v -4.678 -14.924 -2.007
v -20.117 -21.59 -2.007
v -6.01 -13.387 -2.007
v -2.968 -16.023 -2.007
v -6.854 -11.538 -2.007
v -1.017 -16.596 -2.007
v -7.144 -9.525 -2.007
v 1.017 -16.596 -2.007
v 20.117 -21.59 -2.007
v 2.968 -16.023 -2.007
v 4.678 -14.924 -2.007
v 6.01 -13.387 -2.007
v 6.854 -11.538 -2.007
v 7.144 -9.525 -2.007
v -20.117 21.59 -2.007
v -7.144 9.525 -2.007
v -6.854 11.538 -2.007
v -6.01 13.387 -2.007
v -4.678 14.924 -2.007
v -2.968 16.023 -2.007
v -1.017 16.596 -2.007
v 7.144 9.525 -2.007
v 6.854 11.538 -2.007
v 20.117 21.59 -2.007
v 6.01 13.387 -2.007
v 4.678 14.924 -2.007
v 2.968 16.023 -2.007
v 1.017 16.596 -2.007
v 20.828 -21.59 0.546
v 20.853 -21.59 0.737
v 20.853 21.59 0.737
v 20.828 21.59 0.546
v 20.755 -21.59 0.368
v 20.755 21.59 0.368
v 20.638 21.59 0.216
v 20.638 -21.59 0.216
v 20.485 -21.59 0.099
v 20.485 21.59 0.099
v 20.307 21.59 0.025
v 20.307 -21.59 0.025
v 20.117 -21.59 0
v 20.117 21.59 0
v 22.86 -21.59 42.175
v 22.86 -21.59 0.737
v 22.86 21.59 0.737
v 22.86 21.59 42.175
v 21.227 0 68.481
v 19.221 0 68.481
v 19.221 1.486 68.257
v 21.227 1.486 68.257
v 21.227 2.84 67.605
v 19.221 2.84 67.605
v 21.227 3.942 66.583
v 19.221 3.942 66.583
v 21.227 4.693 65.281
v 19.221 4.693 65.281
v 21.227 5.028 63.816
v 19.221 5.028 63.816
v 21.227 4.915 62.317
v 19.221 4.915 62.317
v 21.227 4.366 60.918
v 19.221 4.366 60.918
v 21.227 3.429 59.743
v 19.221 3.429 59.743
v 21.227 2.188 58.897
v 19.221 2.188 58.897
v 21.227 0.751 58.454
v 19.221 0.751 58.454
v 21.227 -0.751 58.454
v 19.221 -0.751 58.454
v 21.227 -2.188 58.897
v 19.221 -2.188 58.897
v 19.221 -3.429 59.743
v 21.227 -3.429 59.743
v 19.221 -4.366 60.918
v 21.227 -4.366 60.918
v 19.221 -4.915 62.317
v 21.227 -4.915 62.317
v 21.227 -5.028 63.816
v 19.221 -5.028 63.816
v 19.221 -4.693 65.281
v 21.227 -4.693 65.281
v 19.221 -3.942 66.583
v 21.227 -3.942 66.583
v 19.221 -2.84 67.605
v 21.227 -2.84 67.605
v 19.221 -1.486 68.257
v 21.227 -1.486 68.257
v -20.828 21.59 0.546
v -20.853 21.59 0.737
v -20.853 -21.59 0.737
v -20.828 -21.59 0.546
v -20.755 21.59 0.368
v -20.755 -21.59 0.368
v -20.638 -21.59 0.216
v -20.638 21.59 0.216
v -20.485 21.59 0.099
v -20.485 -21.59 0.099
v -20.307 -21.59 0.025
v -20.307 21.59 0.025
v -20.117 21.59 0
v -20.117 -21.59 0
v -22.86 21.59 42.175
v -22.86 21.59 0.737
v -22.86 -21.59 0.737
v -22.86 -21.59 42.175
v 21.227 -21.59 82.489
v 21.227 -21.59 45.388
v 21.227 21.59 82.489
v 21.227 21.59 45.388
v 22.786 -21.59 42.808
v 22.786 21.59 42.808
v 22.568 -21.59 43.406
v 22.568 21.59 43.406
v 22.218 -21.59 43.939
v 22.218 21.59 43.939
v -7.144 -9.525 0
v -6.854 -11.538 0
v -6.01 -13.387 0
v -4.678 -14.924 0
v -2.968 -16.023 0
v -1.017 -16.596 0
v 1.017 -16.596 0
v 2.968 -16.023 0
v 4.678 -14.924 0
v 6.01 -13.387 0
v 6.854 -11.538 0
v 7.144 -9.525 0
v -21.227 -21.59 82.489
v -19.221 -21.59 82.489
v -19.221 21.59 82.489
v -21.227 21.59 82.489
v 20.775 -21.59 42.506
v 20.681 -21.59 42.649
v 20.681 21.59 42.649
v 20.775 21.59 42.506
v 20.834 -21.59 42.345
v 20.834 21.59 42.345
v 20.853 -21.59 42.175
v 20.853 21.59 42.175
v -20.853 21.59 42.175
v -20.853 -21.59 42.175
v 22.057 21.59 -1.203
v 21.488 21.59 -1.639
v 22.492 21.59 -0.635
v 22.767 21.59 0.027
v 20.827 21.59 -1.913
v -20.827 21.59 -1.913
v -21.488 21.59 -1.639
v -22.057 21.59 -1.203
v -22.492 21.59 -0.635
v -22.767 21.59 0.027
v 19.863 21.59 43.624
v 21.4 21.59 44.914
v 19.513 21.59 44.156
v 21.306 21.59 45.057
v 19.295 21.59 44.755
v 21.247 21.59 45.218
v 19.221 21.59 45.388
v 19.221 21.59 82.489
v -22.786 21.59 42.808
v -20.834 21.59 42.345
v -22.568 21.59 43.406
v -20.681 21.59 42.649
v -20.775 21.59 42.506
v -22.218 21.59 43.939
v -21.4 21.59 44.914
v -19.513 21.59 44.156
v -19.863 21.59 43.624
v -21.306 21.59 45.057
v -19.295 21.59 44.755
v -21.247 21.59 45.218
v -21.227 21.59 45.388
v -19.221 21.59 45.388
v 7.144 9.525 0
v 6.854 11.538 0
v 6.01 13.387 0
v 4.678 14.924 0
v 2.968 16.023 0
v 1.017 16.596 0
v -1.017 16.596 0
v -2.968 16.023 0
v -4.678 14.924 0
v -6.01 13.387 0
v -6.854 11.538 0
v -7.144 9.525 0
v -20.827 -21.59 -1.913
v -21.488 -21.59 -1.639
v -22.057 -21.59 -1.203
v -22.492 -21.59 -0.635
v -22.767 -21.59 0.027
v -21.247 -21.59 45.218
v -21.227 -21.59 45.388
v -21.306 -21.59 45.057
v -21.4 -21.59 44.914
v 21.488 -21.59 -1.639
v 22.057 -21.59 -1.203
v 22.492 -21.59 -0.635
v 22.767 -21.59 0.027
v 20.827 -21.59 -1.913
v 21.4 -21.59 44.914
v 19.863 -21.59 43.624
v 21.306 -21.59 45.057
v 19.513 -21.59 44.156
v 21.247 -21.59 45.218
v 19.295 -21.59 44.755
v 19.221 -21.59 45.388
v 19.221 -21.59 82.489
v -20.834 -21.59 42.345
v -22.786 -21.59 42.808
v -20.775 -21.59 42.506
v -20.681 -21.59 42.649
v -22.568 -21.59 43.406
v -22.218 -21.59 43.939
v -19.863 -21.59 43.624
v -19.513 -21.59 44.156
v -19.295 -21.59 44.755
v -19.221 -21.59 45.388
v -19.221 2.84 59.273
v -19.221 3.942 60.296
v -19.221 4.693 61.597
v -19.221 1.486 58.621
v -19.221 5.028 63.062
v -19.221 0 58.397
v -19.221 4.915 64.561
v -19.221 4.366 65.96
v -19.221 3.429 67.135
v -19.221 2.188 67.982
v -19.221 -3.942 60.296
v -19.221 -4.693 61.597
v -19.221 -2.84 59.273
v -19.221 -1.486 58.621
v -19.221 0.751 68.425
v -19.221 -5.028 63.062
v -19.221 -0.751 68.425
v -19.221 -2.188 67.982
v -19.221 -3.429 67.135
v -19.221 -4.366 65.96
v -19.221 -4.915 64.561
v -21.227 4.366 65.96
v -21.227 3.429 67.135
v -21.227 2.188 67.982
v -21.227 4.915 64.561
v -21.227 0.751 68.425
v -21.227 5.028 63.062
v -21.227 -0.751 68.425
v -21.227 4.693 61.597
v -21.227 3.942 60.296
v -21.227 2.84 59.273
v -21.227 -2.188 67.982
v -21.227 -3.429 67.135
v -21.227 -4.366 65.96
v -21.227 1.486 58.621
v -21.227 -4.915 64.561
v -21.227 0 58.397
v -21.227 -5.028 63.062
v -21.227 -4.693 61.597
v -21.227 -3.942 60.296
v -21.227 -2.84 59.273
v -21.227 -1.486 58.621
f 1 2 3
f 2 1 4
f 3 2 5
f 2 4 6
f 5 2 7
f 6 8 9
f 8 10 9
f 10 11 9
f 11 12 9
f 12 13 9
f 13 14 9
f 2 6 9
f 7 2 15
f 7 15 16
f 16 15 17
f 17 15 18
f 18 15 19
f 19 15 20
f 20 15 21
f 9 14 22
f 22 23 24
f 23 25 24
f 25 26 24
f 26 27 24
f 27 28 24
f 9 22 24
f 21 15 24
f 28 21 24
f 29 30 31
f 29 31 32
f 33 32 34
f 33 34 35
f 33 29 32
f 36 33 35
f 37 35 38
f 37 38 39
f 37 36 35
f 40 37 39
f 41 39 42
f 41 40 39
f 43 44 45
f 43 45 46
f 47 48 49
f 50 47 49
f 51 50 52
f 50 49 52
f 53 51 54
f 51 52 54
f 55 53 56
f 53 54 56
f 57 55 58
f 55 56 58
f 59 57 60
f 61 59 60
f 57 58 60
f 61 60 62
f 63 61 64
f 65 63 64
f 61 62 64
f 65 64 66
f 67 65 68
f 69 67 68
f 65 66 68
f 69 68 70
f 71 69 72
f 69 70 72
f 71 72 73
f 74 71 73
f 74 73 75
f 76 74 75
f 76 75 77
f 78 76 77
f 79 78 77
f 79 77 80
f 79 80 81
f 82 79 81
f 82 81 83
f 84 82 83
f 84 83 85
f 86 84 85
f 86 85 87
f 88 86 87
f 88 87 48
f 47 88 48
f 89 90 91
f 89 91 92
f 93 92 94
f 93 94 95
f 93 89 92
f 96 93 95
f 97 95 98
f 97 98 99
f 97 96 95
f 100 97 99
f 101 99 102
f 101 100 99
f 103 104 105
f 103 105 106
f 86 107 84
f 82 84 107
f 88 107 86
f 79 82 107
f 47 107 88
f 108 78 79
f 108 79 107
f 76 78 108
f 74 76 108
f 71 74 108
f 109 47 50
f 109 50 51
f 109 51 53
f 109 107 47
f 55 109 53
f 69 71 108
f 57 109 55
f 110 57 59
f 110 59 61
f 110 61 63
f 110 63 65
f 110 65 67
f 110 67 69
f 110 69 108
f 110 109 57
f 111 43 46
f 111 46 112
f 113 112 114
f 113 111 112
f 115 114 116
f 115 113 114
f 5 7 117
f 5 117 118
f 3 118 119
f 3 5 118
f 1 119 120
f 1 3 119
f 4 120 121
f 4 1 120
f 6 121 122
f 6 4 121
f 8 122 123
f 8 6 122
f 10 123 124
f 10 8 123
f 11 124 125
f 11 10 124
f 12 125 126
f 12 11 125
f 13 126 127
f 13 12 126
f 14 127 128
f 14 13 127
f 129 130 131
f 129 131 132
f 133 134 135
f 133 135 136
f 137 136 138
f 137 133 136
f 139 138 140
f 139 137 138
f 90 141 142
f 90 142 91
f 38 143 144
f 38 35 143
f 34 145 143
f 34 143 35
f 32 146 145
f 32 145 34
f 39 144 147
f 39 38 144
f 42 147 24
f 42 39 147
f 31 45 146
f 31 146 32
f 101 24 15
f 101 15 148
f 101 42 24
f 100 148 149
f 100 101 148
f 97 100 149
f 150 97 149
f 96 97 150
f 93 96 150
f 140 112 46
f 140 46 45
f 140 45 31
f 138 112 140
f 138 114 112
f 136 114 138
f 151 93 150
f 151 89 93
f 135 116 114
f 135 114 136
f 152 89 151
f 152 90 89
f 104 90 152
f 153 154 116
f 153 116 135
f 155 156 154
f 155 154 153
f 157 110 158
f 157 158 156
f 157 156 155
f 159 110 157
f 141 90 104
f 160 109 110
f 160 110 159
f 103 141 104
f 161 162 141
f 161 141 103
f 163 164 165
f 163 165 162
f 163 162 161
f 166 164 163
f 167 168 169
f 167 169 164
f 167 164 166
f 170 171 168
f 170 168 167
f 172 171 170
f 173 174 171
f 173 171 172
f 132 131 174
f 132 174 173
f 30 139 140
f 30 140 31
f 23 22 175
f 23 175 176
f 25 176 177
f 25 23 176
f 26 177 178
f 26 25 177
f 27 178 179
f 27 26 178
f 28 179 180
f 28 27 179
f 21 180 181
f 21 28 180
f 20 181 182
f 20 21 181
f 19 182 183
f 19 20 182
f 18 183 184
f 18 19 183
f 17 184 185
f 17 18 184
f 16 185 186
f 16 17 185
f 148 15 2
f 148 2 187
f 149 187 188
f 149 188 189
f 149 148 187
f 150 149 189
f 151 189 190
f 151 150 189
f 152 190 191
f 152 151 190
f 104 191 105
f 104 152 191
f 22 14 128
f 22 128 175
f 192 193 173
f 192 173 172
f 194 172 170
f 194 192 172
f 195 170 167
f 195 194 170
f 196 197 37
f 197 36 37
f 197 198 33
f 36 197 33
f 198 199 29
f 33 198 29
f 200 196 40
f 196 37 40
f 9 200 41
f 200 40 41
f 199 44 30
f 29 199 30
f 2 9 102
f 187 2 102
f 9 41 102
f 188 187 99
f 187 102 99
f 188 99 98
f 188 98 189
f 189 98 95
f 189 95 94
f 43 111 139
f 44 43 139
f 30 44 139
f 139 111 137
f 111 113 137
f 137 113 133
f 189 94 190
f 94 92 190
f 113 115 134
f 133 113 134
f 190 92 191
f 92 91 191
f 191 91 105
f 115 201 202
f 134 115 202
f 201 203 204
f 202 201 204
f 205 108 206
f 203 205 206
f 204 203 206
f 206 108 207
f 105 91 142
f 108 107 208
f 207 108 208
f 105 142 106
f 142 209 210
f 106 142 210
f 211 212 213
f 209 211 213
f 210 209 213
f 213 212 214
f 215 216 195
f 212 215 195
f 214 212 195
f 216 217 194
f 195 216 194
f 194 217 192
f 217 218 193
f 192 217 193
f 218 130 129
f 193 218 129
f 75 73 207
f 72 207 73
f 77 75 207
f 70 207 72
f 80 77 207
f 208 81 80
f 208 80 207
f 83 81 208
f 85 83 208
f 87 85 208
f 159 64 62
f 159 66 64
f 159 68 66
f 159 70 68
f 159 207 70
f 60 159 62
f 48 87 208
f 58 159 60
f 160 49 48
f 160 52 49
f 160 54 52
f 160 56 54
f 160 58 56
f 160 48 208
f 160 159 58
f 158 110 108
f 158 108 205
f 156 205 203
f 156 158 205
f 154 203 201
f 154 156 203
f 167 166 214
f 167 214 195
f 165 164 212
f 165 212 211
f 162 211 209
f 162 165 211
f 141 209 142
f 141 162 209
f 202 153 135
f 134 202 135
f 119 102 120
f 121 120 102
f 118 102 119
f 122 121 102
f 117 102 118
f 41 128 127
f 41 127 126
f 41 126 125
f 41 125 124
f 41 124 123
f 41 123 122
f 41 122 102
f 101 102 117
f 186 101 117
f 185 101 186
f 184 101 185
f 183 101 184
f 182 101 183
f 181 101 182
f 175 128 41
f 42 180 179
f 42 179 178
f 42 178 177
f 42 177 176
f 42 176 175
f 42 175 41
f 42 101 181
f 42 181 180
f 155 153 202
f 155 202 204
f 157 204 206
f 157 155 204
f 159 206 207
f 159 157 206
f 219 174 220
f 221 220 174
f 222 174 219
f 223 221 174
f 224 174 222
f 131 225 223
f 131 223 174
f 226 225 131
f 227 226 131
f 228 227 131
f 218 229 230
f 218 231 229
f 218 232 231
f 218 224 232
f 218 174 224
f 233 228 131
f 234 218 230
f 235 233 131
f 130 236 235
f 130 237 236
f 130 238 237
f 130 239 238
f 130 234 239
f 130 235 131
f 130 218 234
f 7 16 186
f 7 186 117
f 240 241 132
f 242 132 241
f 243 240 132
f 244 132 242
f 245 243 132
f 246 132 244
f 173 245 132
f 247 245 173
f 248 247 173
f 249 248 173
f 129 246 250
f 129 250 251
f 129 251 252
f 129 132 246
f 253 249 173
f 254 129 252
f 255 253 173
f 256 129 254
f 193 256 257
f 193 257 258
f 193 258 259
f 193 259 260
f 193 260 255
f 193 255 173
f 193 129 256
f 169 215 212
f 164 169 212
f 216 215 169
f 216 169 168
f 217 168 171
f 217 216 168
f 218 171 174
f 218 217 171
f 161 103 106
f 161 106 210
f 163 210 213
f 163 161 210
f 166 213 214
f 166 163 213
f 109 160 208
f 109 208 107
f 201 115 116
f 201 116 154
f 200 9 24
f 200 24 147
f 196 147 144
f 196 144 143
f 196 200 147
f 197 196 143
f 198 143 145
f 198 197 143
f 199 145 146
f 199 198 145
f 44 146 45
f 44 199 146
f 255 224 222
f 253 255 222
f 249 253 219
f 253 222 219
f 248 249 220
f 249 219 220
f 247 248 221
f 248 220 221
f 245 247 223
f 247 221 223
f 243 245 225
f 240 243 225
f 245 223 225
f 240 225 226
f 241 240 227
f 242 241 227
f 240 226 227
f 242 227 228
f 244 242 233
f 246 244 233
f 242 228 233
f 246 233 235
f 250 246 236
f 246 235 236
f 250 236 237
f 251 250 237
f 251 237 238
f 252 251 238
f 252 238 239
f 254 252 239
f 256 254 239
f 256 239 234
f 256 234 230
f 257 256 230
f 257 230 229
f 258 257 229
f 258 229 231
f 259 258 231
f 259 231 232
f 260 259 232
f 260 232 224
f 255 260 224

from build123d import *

# Parameters (mm, degrees)
SKETCH1_W                      = 45.72
SKETCH1_H                      = 43.18
BASE_FLANGE1_DEPTH             = 2.0066
EDGE_FLANGE1_STRIP_W           = 9.4996
EDGE_FLANGE1_STRIP_H           = 2.0066
EDGE_FLANGE1_STRIP_CUT_DEPTH   = 43.18
EDGE_FLANGE1_STRIP_2_W         = 9.4996
EDGE_FLANGE1_STRIP_2_H         = 2.0066
EDGE_FLANGE1_STRIP_CUT_2_DEPTH = 43.18
EDGE_FLANGE1_DEPTH             = 43.18
EDGE_FLANGE1_BEND_DEPTH        = 43.18
EDGE_FLANGE2_STRIP_CUT_DEPTH   = 43.18
EDGE_FLANGE2_STRIP_CUT_2_DEPTH = 43.18
EDGE_FLANGE2_DEPTH             = 43.18
EDGE_FLANGE2_BEND_DEPTH        = 43.18
EDGE_FLANGE4_STRIP_CUT_DEPTH   = 43.18
EDGE_FLANGE4_STRIP_CUT_2_DEPTH = 43.18
EDGE_FLANGE4_DEPTH             = 43.18
EDGE_FLANGE4_BEND_DEPTH        = 43.18
F_3_8_CLEARANCE_HOLE3_D        = 10.0838
F_3_8_CLEARANCE_HOLE3_DEPTH    = 25.4
F_3_8_CLEARANCE_HOLE3_TIP      = 3.029479155
F_3_8_CLEARANCE_HOLE4_D        = 10.0838
F_3_8_CLEARANCE_HOLE4_DEPTH    = 25.4
F_3_8_CLEARANCE_HOLE4_TIP      = 3.029479155
CUT_EXTRUDE1_REACH             = 92.157


# Sheet-metal steps are written as plain solids
with BuildPart() as part:
    # Sketch1 → Base-Flange1 (new body)
    with BuildSketch(Plane.XY):
        Rectangle(SKETCH1_W, SKETCH1_H)
    extrude(amount=-BASE_FLANGE1_DEPTH)

    # Edge-Flange1 strip (across the edge) → Edge-Flange1 strip cut (cut)
    with BuildSketch(Plane(origin=(22.86, -21.59, 0), x_dir=(-1, 0, 0), z_dir=(0, 1, 0))):
        with Locations((-2.0066, -1.0033)):
            Rectangle(EDGE_FLANGE1_STRIP_W, EDGE_FLANGE1_STRIP_H)
    extrude(amount=EDGE_FLANGE1_STRIP_CUT_DEPTH, mode=Mode.SUBTRACT)

    # Edge-Flange1 strip 2 (across the edge) → Edge-Flange1 strip cut 2 (cut)
    with BuildSketch(Plane(origin=(-22.86, 21.59, 0), x_dir=(1, 0, 0), z_dir=(0, -1, 0))):
        with Locations((-2.0066, -1.0033)):
            Rectangle(EDGE_FLANGE1_STRIP_2_W, EDGE_FLANGE1_STRIP_2_H)
    extrude(amount=EDGE_FLANGE1_STRIP_CUT_2_DEPTH, mode=Mode.SUBTRACT)

    # Edge-Flange1 section (across the edge) → Edge-Flange1 (add)
    with BuildSketch(Plane(origin=(22.86, -21.59, 0), x_dir=(-1, 0, 0), z_dir=(0, 1, 0))):
        with BuildLine():
            Line((0, 0.7366), (0, 42.4434))
            Line((0, 42.4434), (2.0066, 42.4434))
            Line((2.0066, 42.4434), (2.0066, 0.7366))
            ThreePointArc((2.0066, 0.7366), (2.222345145, 0.215745145), (2.7432, 0))
            Line((2.7432, 0), (2.7432, -2.0066))
            ThreePointArc((2.7432, -2.0066), (0.803464678, -1.203135322), (0, 0.7366))
        make_face()
    extrude(amount=EDGE_FLANGE1_DEPTH)

    # Edge-Flange1 section 2 (across the edge) → Edge-Flange1 bend (add)
    with BuildSketch(Plane(origin=(-22.86, 21.59, 0), x_dir=(1, 0, 0), z_dir=(0, -1, 0))):
        with BuildLine():
            Line((0, 0.7366), (0, 42.4434))
            Line((0, 42.4434), (2.0066, 42.4434))
            Line((2.0066, 42.4434), (2.0066, 0.7366))
            ThreePointArc((2.0066, 0.7366), (2.222345145, 0.215745145), (2.7432, 0))
            Line((2.7432, 0), (2.7432, -2.0066))
            ThreePointArc((2.7432, -2.0066), (0.803464678, -1.203135322), (0, 0.7366))
        make_face()
    extrude(amount=EDGE_FLANGE1_BEND_DEPTH)

    # Edge-Flange2 strip (across the edge) → Edge-Flange2 strip cut (cut)
    with BuildSketch(Plane(origin=(20.8534, -21.59, 42.4434), x_dir=(-0.7660444431189839, 0, -0.6427876096865324), z_dir=(0, 1, 0))):
        Polygon((-7.471038293, 5.781921296), (-1.364813116, -1.495194496), (0.172331663, -0.205376879), (-5.933893514, 7.071738913), align=None)
    extrude(amount=EDGE_FLANGE2_STRIP_CUT_DEPTH, mode=Mode.SUBTRACT)

    # Edge-Flange2 strip 2 (across the edge) → Edge-Flange2 strip cut 2 (cut)
    with BuildSketch(Plane(origin=(-20.8534, 21.59, 42.4434), x_dir=(0.7660444431189839, 0, -0.6427876096865324), z_dir=(0, -1, 0))):
        Polygon((-7.471038293, 5.781921296), (-1.364813116, -1.495194496), (0.172331663, -0.205376879), (-5.933893514, 7.071738913), align=None)
    extrude(amount=EDGE_FLANGE2_STRIP_CUT_2_DEPTH, mode=Mode.SUBTRACT)

    # Edge-Flange2 section (across the edge) → Edge-Flange2 (add)
    with BuildSketch(Plane(origin=(20.8534, -21.59, 42.4434), x_dir=(-0.7660444431189839, 0, -0.6427876096865324), z_dir=(0, 1, 0))):
        with BuildLine():
            Line((-2.0066, 0.268100475), (-2.0066, 1.809657328))
            Line((-2.0066, 1.809657328), (0, 1.809657328))
            Line((0, 1.809657328), (0, 0.268100475))
            ThreePointArc((0, 0.268100475), (0.044422416, 0.016168437), (0.172331663, -0.205376879))
            Line((0.172331663, -0.205376879), (-1.364813116, -1.495194496))
            ThreePointArc((-1.364813116, -1.495194496), (-1.841164797, -0.670129183), (-2.0066, 0.268100475))
        make_face()
    extrude(amount=EDGE_FLANGE2_DEPTH)

    # Edge-Flange2 section 2 (across the edge) → Edge-Flange2 bend (add)
    with BuildSketch(Plane(origin=(-20.8534, 21.59, 42.4434), x_dir=(0.7660444431189839, 0, -0.6427876096865324), z_dir=(0, -1, 0))):
        with BuildLine():
            Line((-2.0066, 0.268100475), (-2.0066, 1.809657328))
            Line((-2.0066, 1.809657328), (0, 1.809657328))
            Line((0, 1.809657328), (0, 0.268100475))
            ThreePointArc((0, 0.268100475), (0.044422416, 0.016168437), (0.172331663, -0.205376879))
            Line((0.172331663, -0.205376879), (-1.364813116, -1.495194496))
            ThreePointArc((-1.364813116, -1.495194496), (-1.841164797, -0.670129183), (-2.0066, 0.268100475))
        make_face()
    extrude(amount=EDGE_FLANGE2_BEND_DEPTH)

    # Edge-Flange4 strip (across the edge) → Edge-Flange4 strip cut (cut)
    with BuildSketch(Plane(origin=(-21.227319471, -21.59, 45.119495558), x_dir=(-1, 0, 0), z_dir=(0, 1, 0))):
        Polygon((-7.471038293, 5.781921296), (-1.364813116, -1.495194496), (0.172331663, -0.205376879), (-5.933893514, 7.071738913), align=None)
    extrude(amount=EDGE_FLANGE4_STRIP_CUT_DEPTH, mode=Mode.SUBTRACT)

    # Edge-Flange4 strip 2 (across the edge) → Edge-Flange4 strip cut 2 (cut)
    with BuildSketch(Plane(origin=(21.227319471, 21.59, 45.119495558), x_dir=(1, 0, 0), z_dir=(0, -1, 0))):
        Polygon((-7.471038293, 5.781921296), (-1.364813116, -1.495194496), (0.172331663, -0.205376879), (-5.933893514, 7.071738913), align=None)
    extrude(amount=EDGE_FLANGE4_STRIP_CUT_2_DEPTH, mode=Mode.SUBTRACT)

    # Edge-Flange4 section (across the edge) → Edge-Flange4 (add)
    with BuildSketch(Plane(origin=(-21.227319471, -21.59, 45.119495558), x_dir=(-1, 0, 0), z_dir=(0, 1, 0))):
        with BuildLine():
            Line((-2.0066, 0.268100475), (-2.0066, 37.369657328))
            Line((-2.0066, 37.369657328), (0, 37.369657328))
            Line((0, 37.369657328), (0, 0.268100475))
            ThreePointArc((0, 0.268100475), (0.044422416, 0.016168437), (0.172331663, -0.205376879))
            Line((0.172331663, -0.205376879), (-1.364813116, -1.495194496))
            ThreePointArc((-1.364813116, -1.495194496), (-1.841164797, -0.670129183), (-2.0066, 0.268100475))
        make_face()
    extrude(amount=EDGE_FLANGE4_DEPTH)

    # Edge-Flange4 section 2 (across the edge) → Edge-Flange4 bend (add)
    with BuildSketch(Plane(origin=(21.227319471, 21.59, 45.119495558), x_dir=(1, 0, 0), z_dir=(0, -1, 0))):
        with BuildLine():
            Line((-2.0066, 0.268100475), (-2.0066, 37.369657328))
            Line((-2.0066, 37.369657328), (0, 37.369657328))
            Line((0, 37.369657328), (0, 0.268100475))
            ThreePointArc((0, 0.268100475), (0.044422416, 0.016168437), (0.172331663, -0.205376879))
            Line((0.172331663, -0.205376879), (-1.364813116, -1.495194496))
            ThreePointArc((-1.364813116, -1.495194496), (-1.841164797, -0.670129183), (-2.0066, 0.268100475))
        make_face()
    extrude(amount=EDGE_FLANGE4_BEND_DEPTH)

    # 3/8 Clearance Hole3
    with Locations(Plane.ZY.offset(21.227319471)):
        with Locations((63.439152886, 0)):
            Hole(F_3_8_CLEARANCE_HOLE3_D / 2, depth=F_3_8_CLEARANCE_HOLE3_DEPTH)
            with Locations((0, 0, -(F_3_8_CLEARANCE_HOLE3_DEPTH + F_3_8_CLEARANCE_HOLE3_TIP / 2))):  # 118° drill point
                Cone(0, F_3_8_CLEARANCE_HOLE3_D / 2, F_3_8_CLEARANCE_HOLE3_TIP, mode=Mode.SUBTRACT)

    # 3/8 Clearance Hole4
    with Locations(Plane(origin=(21.227319471, 0, 0), x_dir=(0, 0, -1), z_dir=(1, 0, 0))):
        with Locations((-63.439152886, 0)):
            Hole(F_3_8_CLEARANCE_HOLE4_D / 2, depth=F_3_8_CLEARANCE_HOLE4_DEPTH)
            with Locations((0, 0, -(F_3_8_CLEARANCE_HOLE4_DEPTH + F_3_8_CLEARANCE_HOLE4_TIP / 2))):  # 118° drill point
                Cone(0, F_3_8_CLEARANCE_HOLE4_D / 2, F_3_8_CLEARANCE_HOLE4_TIP, mode=Mode.SUBTRACT)

    # Sketch38 → Cut-Extrude1 (cut, up to next)
    with BuildSketch(Plane(origin=(0, 0, -2.0066), x_dir=(-1, 0, 0), z_dir=(0, 0, -1)), mode=Mode.PRIVATE) as cut_extrude1_sk1:
        with BuildLine():
            Line((-7.14375, -9.525), (-7.14375, 9.525))
            ThreePointArc((-7.14375, 9.525), (0, 16.66875), (7.14375, 9.525))
            Line((7.14375, 9.525), (7.14375, -9.525))
            ThreePointArc((7.14375, -9.525), (0, -16.66875), (-7.14375, -9.525))
        make_face()
    cut_extrude1_tool1 = extrude(cut_extrude1_sk1.sketch, amount=-CUT_EXTRUDE1_REACH, mode=Mode.PRIVATE) & part.part
    add(cut_extrude1_tool1.solids().sort_by_distance((0, 0, -2.0066))[0], mode=Mode.SUBTRACT)


solid = part.part
